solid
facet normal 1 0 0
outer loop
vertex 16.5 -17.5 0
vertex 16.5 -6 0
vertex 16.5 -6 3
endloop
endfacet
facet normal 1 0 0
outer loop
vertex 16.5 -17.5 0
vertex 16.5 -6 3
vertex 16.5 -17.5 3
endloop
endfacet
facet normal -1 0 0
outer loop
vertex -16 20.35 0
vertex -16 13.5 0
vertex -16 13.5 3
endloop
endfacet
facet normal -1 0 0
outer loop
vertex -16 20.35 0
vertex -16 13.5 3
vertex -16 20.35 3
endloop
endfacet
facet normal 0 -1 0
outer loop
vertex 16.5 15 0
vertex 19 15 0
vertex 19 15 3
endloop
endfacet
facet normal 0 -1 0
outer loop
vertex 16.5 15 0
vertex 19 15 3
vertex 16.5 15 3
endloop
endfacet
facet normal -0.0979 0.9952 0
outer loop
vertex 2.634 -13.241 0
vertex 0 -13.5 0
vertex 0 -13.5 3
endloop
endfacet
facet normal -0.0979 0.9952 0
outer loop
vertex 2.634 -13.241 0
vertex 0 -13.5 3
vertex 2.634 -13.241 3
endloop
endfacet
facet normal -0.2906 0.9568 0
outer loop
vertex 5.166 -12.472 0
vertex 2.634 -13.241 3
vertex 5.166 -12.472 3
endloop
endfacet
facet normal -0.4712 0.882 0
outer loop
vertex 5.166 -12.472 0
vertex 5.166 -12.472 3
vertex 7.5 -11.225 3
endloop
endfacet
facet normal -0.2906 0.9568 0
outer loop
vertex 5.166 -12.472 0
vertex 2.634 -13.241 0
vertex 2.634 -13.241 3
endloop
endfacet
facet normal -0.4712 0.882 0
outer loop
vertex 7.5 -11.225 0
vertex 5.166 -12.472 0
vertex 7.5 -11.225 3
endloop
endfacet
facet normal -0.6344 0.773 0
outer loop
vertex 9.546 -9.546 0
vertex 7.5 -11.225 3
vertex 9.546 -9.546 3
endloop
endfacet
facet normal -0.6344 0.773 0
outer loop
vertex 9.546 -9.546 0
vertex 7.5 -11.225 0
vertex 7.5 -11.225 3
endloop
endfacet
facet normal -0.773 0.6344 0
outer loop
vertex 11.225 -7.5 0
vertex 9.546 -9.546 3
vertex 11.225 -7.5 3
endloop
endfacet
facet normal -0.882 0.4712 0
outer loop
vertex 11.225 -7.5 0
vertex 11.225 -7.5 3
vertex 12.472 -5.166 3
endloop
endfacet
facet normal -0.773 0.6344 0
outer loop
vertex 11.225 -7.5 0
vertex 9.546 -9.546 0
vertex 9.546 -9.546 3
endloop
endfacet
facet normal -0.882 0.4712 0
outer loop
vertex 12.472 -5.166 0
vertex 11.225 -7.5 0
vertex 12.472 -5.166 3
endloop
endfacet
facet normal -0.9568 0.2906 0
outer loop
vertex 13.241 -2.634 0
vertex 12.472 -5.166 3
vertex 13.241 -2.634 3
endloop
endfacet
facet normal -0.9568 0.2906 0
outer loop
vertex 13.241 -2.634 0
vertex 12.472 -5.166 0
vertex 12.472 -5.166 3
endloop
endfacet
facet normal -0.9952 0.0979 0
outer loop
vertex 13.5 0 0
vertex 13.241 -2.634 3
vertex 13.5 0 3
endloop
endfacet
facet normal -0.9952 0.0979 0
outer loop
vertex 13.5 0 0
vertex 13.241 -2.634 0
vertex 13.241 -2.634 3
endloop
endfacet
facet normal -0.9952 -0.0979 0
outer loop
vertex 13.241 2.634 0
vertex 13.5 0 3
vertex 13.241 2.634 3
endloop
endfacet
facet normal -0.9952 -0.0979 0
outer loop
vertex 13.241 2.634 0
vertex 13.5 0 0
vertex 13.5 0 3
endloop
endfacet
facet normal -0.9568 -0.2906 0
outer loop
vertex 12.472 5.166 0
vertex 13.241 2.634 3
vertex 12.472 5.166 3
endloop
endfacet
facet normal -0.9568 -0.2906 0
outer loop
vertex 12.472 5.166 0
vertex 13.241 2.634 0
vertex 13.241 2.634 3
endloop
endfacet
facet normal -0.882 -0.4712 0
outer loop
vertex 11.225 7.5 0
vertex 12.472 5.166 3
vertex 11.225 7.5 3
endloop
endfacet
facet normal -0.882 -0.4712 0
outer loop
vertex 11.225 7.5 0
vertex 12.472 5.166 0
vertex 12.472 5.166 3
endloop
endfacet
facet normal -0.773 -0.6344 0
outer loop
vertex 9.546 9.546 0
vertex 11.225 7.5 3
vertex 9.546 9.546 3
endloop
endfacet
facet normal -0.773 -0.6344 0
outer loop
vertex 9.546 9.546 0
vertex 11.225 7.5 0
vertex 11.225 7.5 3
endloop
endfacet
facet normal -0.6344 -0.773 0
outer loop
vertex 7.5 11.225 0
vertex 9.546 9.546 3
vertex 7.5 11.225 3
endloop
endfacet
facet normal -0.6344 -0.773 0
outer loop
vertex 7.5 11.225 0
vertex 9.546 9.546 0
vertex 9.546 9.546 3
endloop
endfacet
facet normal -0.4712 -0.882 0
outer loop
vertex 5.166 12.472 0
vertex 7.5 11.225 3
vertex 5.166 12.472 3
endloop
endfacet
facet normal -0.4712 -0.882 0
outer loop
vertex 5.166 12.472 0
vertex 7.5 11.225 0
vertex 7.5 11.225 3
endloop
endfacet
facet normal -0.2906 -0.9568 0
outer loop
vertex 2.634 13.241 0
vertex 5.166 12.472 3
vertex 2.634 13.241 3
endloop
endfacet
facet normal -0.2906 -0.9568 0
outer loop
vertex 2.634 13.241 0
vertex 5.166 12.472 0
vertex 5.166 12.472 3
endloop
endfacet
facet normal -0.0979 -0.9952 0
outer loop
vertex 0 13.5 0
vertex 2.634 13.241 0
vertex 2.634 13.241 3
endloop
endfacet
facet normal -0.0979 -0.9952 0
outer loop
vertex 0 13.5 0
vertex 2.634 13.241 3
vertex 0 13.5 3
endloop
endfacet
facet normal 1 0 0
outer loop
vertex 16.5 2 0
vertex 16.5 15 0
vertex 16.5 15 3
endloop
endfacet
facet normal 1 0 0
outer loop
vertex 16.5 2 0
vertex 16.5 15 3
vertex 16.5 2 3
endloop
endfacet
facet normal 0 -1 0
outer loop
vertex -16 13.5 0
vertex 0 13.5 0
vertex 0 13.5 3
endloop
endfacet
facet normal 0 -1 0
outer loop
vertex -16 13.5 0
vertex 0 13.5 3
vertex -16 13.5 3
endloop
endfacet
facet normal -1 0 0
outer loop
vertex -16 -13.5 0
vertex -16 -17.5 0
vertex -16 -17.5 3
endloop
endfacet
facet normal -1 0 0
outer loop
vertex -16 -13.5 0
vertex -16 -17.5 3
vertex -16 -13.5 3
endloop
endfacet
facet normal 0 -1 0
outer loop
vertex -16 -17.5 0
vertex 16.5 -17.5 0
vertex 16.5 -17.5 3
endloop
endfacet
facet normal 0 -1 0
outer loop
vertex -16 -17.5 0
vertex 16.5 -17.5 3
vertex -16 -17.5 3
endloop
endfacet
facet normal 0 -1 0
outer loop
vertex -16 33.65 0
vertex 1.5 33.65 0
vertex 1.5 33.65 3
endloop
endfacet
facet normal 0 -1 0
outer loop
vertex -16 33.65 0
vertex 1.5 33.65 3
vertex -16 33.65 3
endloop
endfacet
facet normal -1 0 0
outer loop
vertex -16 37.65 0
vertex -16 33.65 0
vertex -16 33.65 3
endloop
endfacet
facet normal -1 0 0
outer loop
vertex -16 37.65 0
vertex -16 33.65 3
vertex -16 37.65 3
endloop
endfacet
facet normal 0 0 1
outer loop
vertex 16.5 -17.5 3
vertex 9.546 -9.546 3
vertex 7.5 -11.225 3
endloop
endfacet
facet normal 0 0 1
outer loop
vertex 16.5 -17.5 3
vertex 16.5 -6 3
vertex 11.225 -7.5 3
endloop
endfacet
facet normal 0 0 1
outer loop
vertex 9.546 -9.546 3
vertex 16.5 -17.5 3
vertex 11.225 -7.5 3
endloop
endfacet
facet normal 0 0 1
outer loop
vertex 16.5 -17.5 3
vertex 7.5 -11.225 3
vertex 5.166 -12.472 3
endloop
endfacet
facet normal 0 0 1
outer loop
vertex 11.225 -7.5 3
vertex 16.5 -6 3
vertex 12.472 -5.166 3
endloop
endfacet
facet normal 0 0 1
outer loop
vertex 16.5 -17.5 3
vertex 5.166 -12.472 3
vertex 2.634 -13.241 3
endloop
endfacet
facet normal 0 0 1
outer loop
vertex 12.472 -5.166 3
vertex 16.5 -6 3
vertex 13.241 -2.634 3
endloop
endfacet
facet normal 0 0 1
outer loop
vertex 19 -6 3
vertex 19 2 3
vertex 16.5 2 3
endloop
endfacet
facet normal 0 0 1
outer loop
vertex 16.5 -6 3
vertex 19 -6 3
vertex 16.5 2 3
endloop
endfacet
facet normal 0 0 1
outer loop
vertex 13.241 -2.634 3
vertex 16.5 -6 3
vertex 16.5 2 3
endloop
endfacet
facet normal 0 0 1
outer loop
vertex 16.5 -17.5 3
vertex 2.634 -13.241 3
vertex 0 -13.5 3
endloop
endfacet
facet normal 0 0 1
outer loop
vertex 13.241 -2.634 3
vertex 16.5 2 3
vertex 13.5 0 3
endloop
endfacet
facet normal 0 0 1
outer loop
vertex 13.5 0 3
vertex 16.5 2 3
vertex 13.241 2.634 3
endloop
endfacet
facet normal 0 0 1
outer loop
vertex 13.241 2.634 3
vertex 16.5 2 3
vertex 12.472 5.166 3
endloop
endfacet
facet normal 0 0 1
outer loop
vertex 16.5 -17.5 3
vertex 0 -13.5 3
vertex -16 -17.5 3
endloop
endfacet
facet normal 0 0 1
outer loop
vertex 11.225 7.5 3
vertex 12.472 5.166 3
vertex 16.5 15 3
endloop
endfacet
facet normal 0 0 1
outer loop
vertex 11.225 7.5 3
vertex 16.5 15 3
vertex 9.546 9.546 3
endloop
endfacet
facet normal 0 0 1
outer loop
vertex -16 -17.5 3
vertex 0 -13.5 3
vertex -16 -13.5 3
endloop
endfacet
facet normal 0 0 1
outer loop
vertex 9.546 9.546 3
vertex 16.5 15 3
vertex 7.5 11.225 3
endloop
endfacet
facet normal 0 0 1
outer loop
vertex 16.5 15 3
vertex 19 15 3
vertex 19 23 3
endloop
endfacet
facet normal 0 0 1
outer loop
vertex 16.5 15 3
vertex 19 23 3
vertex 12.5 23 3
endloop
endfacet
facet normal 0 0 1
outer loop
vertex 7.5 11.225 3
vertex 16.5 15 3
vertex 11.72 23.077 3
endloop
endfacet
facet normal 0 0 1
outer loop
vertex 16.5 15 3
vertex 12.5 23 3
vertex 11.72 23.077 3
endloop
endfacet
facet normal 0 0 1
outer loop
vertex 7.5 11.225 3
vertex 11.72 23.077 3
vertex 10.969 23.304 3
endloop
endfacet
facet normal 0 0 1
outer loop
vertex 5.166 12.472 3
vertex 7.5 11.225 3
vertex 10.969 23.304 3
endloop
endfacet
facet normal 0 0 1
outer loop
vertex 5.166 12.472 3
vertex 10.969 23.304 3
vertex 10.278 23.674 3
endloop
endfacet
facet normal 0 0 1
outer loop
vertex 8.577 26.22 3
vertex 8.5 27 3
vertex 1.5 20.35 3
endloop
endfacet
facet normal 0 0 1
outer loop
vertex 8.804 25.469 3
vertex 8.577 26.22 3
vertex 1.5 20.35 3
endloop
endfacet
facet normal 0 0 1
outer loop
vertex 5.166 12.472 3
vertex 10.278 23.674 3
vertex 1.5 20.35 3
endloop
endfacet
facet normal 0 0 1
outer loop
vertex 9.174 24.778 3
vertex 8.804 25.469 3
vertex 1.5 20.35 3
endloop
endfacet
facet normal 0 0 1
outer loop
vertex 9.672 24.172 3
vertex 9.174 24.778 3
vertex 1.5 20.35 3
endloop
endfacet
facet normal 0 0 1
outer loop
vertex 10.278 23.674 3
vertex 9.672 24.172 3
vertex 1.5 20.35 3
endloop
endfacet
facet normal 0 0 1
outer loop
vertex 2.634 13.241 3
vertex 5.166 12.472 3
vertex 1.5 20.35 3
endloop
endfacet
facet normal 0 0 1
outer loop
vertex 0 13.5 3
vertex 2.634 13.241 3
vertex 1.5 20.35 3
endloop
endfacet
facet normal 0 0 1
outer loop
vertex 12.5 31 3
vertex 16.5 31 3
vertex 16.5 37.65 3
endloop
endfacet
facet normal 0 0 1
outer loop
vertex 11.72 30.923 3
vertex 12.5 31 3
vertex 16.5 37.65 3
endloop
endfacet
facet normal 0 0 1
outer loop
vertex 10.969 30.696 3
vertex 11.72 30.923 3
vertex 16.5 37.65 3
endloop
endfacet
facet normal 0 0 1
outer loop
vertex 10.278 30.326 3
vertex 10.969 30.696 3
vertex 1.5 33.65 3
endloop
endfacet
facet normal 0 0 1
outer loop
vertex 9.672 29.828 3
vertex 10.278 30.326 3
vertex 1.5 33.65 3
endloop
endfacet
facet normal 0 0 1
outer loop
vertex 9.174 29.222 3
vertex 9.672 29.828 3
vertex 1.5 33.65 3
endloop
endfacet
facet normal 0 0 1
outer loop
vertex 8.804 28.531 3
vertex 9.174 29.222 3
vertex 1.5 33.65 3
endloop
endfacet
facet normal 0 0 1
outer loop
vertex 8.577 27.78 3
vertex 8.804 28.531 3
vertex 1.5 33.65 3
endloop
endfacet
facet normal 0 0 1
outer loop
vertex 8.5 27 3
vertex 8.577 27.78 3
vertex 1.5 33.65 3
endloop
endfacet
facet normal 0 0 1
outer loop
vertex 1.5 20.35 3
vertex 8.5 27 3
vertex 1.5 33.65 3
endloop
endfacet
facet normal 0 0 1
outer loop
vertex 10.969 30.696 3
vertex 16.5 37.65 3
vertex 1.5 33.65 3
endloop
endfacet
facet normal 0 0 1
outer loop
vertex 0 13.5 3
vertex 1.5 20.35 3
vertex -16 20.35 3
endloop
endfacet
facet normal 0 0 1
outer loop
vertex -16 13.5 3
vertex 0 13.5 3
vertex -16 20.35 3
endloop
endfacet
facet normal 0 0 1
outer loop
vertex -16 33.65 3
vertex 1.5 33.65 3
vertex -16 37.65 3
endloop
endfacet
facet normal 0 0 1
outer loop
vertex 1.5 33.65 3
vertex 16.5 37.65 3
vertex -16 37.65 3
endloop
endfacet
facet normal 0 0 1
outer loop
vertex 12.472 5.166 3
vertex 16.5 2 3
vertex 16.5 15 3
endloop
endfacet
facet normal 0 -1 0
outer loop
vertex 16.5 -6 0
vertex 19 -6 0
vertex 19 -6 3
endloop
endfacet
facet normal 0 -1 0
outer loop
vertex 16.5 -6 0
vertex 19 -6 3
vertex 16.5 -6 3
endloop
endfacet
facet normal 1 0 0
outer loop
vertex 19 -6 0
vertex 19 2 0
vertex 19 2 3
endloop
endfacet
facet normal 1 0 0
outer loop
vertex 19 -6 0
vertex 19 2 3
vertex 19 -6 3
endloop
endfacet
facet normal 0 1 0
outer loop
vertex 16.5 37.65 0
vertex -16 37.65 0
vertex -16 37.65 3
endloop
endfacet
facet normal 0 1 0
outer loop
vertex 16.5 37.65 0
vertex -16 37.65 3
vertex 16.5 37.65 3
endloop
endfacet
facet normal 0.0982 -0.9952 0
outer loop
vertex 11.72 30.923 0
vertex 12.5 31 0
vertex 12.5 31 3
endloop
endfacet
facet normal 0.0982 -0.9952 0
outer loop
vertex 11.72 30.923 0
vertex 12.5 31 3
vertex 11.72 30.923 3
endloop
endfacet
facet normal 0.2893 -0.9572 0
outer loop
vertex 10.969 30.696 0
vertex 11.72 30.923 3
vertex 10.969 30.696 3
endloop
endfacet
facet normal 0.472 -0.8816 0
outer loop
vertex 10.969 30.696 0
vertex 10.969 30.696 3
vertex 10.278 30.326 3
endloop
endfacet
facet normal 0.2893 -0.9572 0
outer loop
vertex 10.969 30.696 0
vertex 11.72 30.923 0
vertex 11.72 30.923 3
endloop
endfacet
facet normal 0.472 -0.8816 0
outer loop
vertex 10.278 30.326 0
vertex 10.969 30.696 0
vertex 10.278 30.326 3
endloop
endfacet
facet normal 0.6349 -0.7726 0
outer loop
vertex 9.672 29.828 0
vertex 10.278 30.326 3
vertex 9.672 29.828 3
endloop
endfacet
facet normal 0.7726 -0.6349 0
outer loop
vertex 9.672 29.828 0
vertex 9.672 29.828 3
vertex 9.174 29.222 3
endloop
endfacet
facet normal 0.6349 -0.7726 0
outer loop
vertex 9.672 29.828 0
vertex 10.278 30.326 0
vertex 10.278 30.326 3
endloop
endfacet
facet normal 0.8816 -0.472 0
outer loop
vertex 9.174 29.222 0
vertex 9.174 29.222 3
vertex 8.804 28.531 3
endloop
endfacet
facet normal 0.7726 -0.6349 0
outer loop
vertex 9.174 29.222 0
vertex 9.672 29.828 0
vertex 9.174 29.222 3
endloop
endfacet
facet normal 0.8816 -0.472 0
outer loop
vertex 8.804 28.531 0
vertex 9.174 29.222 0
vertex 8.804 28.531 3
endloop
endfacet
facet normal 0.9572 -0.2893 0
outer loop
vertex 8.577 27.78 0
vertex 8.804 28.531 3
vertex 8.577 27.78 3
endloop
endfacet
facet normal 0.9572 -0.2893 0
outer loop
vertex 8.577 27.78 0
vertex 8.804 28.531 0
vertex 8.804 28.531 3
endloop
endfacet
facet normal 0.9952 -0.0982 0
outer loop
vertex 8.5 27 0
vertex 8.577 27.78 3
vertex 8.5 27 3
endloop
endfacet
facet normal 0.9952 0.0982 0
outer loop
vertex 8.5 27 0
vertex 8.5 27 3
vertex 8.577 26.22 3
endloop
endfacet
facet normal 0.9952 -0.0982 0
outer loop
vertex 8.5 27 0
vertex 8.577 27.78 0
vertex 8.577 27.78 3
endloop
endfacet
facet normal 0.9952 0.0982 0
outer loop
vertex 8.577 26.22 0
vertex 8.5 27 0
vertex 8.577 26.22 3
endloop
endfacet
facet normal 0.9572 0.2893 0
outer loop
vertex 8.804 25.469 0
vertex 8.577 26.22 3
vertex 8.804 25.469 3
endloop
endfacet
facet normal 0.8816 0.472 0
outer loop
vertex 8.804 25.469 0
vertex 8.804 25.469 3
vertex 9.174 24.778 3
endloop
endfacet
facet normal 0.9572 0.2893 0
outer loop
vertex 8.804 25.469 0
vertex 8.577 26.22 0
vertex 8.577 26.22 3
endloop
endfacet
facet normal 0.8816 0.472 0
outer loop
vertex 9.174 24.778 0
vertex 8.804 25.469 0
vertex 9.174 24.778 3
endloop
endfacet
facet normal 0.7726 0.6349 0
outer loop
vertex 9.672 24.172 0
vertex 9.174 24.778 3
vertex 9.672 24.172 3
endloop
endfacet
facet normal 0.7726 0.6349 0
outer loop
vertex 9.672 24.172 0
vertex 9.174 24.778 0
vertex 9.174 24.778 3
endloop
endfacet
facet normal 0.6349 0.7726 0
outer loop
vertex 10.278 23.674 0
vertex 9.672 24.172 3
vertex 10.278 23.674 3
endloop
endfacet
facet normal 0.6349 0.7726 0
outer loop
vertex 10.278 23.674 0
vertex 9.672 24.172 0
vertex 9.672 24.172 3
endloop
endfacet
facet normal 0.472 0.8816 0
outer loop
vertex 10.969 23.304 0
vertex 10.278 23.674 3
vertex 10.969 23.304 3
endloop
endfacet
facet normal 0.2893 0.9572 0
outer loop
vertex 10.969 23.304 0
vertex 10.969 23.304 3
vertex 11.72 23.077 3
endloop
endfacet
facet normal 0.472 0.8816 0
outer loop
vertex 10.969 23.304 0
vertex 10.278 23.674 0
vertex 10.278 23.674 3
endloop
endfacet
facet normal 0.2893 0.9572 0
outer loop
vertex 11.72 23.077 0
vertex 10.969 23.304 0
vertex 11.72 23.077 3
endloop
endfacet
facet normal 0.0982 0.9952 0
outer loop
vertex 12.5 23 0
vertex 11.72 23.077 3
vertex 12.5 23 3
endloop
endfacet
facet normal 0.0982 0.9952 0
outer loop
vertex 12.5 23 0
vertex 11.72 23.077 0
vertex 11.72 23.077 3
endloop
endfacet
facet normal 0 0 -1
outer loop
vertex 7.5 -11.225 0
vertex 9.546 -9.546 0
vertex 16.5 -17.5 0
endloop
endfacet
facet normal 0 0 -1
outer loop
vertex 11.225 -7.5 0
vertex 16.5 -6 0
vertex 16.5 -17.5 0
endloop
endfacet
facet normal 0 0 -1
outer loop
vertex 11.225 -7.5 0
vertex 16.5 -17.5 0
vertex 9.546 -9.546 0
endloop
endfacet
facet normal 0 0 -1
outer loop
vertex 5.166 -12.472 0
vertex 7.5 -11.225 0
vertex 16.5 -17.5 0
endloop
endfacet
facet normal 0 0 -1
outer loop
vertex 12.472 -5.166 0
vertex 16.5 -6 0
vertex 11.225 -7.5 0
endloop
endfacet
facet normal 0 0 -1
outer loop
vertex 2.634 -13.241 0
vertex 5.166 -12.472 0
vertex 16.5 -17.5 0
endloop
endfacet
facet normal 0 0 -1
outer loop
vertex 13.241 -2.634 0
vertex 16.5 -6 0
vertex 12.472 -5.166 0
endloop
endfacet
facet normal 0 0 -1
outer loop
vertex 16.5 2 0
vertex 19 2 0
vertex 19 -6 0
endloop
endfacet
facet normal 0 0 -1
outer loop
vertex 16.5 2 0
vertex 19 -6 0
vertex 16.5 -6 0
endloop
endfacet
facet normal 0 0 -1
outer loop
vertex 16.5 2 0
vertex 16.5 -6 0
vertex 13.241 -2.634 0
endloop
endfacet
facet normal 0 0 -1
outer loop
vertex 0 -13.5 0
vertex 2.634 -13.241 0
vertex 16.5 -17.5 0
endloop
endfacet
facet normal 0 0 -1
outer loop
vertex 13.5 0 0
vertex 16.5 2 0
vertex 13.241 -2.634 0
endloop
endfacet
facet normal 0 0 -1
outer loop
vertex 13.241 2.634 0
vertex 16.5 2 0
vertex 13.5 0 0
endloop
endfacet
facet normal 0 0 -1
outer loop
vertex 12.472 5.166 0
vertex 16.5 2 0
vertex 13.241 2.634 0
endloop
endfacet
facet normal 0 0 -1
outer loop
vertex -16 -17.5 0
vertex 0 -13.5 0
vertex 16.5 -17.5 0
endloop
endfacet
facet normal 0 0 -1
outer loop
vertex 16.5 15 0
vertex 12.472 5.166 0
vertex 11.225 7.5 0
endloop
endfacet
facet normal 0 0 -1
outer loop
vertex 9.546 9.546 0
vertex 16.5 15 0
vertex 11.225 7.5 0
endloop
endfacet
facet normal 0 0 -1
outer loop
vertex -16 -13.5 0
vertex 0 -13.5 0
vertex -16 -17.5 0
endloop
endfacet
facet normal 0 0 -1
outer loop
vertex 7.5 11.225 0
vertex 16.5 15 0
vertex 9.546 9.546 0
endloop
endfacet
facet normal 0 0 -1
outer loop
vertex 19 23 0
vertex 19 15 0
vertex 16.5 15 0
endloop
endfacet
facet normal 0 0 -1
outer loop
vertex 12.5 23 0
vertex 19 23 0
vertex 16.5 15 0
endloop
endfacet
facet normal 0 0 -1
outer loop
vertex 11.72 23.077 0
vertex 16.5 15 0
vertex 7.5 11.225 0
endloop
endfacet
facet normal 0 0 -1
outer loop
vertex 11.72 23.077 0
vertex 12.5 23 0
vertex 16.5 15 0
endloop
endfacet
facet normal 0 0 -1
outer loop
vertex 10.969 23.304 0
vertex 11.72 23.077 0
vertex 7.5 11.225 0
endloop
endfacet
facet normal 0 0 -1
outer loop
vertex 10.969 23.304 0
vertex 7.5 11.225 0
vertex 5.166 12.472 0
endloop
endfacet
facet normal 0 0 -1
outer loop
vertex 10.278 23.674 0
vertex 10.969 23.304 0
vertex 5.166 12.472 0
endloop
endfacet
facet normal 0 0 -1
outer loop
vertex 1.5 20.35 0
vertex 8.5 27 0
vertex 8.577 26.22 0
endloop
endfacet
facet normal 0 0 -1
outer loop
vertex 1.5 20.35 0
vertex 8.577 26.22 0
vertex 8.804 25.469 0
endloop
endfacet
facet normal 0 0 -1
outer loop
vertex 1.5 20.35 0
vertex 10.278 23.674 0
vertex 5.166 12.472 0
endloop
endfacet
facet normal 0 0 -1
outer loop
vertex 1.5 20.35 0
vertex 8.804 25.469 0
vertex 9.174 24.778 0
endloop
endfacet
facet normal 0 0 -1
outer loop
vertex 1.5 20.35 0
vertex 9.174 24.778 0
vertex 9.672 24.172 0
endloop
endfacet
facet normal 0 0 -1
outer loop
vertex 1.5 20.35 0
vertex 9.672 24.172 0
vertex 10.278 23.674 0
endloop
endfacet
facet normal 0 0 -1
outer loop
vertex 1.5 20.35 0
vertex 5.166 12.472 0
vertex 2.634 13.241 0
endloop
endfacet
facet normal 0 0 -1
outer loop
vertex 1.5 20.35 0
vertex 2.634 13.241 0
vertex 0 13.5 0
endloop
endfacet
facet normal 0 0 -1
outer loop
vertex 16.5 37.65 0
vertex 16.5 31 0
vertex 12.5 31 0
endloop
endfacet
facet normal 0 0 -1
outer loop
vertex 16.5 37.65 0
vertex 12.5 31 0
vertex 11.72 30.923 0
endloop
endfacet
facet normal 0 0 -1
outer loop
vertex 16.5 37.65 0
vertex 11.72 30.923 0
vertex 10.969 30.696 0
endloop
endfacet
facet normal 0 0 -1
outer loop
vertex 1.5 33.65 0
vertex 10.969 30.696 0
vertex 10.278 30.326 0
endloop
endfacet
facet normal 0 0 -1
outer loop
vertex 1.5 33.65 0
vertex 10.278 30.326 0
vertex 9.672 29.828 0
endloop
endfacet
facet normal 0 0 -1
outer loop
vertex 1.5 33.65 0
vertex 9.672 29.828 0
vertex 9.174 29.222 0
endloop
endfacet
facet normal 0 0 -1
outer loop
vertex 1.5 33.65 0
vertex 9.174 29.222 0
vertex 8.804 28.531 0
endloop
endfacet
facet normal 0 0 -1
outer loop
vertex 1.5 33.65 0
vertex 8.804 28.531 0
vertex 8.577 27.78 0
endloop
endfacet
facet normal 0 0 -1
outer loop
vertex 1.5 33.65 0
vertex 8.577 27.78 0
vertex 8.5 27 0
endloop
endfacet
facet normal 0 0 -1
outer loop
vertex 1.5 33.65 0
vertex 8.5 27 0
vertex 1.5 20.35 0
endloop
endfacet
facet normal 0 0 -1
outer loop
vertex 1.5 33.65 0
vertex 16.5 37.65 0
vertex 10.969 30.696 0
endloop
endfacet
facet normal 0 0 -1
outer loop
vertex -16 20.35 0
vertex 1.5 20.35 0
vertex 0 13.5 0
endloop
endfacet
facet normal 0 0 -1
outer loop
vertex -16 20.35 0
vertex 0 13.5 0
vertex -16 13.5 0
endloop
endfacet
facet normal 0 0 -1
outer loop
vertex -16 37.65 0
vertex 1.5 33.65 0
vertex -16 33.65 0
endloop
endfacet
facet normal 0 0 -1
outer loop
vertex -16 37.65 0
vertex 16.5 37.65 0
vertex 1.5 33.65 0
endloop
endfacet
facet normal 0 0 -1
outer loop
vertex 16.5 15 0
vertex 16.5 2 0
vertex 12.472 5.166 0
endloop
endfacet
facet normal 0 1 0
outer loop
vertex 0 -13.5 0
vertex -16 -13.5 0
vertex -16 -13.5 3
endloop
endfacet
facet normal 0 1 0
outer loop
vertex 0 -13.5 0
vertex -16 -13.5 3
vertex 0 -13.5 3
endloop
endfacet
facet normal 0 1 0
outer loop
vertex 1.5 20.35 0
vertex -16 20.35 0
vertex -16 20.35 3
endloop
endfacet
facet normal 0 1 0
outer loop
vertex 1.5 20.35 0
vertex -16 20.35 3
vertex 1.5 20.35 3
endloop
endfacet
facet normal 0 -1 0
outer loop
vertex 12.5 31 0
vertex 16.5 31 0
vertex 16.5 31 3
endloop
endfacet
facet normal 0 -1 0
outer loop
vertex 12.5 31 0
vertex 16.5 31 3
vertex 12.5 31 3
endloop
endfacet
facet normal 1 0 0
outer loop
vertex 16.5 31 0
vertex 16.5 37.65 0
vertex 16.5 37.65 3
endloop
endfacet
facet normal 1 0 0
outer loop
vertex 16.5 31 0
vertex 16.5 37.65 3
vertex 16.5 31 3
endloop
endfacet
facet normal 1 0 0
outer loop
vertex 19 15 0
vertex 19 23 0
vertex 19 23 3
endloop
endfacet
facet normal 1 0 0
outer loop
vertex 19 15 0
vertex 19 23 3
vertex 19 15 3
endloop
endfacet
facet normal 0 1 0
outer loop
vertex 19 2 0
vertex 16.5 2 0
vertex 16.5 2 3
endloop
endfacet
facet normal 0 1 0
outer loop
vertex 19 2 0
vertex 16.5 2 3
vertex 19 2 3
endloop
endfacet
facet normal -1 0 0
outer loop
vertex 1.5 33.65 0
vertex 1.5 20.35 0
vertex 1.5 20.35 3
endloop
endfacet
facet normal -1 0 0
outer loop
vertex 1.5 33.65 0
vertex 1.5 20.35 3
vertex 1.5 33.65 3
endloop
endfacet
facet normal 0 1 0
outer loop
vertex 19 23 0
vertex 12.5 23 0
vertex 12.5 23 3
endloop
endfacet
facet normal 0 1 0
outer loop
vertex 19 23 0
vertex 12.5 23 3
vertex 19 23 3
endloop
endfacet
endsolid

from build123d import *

# Parameters (mm, degrees)
BOSS_EXTRU_1_DEPTH = 3


with BuildPart() as part:
    # Esquisse1 → Boss.-Extru.1 (new body)
    with BuildSketch(Plane.XY):
        with BuildLine():
            Line((-16, 33.65), (-16, 37.65))
            Line((-16, 37.65), (16.5, 37.65))
            Line((16.5, 37.65), (16.5, 31))
            Line((16.5, 31), (12.5, 31))
            ThreePointArc((12.5, 31), (8.5, 27), (12.5, 23))
            Line((12.5, 23), (19, 23))
            Line((19, 23), (19, 15))
            Line((19, 15), (16.5, 15))
            Line((16.5, 15), (16.5, 2))
            Line((16.5, 2), (19, 2))
            Line((19, 2), (19, -6))
            Line((19, -6), (16.5, -6))
            Line((16.5, -6), (16.5, -17.5))
            Line((16.5, -17.5), (-16, -17.5))
            Line((-16, -17.5), (-16, -13.5))
            Line((-16, -13.5), (0, -13.5))
            ThreePointArc((0, -13.5), (13.5, 0), (0, 13.5))
            Line((0, 13.5), (-16, 13.5))
            Line((-16, 13.5), (-16, 20.35))
            Line((-16, 20.35), (1.5, 20.35))
            Line((1.5, 20.35), (1.5, 33.65))
            Line((1.5, 33.65), (-16, 33.65))
        make_face()
    extrude(amount=BOSS_EXTRU_1_DEPTH)


solid = part.part
